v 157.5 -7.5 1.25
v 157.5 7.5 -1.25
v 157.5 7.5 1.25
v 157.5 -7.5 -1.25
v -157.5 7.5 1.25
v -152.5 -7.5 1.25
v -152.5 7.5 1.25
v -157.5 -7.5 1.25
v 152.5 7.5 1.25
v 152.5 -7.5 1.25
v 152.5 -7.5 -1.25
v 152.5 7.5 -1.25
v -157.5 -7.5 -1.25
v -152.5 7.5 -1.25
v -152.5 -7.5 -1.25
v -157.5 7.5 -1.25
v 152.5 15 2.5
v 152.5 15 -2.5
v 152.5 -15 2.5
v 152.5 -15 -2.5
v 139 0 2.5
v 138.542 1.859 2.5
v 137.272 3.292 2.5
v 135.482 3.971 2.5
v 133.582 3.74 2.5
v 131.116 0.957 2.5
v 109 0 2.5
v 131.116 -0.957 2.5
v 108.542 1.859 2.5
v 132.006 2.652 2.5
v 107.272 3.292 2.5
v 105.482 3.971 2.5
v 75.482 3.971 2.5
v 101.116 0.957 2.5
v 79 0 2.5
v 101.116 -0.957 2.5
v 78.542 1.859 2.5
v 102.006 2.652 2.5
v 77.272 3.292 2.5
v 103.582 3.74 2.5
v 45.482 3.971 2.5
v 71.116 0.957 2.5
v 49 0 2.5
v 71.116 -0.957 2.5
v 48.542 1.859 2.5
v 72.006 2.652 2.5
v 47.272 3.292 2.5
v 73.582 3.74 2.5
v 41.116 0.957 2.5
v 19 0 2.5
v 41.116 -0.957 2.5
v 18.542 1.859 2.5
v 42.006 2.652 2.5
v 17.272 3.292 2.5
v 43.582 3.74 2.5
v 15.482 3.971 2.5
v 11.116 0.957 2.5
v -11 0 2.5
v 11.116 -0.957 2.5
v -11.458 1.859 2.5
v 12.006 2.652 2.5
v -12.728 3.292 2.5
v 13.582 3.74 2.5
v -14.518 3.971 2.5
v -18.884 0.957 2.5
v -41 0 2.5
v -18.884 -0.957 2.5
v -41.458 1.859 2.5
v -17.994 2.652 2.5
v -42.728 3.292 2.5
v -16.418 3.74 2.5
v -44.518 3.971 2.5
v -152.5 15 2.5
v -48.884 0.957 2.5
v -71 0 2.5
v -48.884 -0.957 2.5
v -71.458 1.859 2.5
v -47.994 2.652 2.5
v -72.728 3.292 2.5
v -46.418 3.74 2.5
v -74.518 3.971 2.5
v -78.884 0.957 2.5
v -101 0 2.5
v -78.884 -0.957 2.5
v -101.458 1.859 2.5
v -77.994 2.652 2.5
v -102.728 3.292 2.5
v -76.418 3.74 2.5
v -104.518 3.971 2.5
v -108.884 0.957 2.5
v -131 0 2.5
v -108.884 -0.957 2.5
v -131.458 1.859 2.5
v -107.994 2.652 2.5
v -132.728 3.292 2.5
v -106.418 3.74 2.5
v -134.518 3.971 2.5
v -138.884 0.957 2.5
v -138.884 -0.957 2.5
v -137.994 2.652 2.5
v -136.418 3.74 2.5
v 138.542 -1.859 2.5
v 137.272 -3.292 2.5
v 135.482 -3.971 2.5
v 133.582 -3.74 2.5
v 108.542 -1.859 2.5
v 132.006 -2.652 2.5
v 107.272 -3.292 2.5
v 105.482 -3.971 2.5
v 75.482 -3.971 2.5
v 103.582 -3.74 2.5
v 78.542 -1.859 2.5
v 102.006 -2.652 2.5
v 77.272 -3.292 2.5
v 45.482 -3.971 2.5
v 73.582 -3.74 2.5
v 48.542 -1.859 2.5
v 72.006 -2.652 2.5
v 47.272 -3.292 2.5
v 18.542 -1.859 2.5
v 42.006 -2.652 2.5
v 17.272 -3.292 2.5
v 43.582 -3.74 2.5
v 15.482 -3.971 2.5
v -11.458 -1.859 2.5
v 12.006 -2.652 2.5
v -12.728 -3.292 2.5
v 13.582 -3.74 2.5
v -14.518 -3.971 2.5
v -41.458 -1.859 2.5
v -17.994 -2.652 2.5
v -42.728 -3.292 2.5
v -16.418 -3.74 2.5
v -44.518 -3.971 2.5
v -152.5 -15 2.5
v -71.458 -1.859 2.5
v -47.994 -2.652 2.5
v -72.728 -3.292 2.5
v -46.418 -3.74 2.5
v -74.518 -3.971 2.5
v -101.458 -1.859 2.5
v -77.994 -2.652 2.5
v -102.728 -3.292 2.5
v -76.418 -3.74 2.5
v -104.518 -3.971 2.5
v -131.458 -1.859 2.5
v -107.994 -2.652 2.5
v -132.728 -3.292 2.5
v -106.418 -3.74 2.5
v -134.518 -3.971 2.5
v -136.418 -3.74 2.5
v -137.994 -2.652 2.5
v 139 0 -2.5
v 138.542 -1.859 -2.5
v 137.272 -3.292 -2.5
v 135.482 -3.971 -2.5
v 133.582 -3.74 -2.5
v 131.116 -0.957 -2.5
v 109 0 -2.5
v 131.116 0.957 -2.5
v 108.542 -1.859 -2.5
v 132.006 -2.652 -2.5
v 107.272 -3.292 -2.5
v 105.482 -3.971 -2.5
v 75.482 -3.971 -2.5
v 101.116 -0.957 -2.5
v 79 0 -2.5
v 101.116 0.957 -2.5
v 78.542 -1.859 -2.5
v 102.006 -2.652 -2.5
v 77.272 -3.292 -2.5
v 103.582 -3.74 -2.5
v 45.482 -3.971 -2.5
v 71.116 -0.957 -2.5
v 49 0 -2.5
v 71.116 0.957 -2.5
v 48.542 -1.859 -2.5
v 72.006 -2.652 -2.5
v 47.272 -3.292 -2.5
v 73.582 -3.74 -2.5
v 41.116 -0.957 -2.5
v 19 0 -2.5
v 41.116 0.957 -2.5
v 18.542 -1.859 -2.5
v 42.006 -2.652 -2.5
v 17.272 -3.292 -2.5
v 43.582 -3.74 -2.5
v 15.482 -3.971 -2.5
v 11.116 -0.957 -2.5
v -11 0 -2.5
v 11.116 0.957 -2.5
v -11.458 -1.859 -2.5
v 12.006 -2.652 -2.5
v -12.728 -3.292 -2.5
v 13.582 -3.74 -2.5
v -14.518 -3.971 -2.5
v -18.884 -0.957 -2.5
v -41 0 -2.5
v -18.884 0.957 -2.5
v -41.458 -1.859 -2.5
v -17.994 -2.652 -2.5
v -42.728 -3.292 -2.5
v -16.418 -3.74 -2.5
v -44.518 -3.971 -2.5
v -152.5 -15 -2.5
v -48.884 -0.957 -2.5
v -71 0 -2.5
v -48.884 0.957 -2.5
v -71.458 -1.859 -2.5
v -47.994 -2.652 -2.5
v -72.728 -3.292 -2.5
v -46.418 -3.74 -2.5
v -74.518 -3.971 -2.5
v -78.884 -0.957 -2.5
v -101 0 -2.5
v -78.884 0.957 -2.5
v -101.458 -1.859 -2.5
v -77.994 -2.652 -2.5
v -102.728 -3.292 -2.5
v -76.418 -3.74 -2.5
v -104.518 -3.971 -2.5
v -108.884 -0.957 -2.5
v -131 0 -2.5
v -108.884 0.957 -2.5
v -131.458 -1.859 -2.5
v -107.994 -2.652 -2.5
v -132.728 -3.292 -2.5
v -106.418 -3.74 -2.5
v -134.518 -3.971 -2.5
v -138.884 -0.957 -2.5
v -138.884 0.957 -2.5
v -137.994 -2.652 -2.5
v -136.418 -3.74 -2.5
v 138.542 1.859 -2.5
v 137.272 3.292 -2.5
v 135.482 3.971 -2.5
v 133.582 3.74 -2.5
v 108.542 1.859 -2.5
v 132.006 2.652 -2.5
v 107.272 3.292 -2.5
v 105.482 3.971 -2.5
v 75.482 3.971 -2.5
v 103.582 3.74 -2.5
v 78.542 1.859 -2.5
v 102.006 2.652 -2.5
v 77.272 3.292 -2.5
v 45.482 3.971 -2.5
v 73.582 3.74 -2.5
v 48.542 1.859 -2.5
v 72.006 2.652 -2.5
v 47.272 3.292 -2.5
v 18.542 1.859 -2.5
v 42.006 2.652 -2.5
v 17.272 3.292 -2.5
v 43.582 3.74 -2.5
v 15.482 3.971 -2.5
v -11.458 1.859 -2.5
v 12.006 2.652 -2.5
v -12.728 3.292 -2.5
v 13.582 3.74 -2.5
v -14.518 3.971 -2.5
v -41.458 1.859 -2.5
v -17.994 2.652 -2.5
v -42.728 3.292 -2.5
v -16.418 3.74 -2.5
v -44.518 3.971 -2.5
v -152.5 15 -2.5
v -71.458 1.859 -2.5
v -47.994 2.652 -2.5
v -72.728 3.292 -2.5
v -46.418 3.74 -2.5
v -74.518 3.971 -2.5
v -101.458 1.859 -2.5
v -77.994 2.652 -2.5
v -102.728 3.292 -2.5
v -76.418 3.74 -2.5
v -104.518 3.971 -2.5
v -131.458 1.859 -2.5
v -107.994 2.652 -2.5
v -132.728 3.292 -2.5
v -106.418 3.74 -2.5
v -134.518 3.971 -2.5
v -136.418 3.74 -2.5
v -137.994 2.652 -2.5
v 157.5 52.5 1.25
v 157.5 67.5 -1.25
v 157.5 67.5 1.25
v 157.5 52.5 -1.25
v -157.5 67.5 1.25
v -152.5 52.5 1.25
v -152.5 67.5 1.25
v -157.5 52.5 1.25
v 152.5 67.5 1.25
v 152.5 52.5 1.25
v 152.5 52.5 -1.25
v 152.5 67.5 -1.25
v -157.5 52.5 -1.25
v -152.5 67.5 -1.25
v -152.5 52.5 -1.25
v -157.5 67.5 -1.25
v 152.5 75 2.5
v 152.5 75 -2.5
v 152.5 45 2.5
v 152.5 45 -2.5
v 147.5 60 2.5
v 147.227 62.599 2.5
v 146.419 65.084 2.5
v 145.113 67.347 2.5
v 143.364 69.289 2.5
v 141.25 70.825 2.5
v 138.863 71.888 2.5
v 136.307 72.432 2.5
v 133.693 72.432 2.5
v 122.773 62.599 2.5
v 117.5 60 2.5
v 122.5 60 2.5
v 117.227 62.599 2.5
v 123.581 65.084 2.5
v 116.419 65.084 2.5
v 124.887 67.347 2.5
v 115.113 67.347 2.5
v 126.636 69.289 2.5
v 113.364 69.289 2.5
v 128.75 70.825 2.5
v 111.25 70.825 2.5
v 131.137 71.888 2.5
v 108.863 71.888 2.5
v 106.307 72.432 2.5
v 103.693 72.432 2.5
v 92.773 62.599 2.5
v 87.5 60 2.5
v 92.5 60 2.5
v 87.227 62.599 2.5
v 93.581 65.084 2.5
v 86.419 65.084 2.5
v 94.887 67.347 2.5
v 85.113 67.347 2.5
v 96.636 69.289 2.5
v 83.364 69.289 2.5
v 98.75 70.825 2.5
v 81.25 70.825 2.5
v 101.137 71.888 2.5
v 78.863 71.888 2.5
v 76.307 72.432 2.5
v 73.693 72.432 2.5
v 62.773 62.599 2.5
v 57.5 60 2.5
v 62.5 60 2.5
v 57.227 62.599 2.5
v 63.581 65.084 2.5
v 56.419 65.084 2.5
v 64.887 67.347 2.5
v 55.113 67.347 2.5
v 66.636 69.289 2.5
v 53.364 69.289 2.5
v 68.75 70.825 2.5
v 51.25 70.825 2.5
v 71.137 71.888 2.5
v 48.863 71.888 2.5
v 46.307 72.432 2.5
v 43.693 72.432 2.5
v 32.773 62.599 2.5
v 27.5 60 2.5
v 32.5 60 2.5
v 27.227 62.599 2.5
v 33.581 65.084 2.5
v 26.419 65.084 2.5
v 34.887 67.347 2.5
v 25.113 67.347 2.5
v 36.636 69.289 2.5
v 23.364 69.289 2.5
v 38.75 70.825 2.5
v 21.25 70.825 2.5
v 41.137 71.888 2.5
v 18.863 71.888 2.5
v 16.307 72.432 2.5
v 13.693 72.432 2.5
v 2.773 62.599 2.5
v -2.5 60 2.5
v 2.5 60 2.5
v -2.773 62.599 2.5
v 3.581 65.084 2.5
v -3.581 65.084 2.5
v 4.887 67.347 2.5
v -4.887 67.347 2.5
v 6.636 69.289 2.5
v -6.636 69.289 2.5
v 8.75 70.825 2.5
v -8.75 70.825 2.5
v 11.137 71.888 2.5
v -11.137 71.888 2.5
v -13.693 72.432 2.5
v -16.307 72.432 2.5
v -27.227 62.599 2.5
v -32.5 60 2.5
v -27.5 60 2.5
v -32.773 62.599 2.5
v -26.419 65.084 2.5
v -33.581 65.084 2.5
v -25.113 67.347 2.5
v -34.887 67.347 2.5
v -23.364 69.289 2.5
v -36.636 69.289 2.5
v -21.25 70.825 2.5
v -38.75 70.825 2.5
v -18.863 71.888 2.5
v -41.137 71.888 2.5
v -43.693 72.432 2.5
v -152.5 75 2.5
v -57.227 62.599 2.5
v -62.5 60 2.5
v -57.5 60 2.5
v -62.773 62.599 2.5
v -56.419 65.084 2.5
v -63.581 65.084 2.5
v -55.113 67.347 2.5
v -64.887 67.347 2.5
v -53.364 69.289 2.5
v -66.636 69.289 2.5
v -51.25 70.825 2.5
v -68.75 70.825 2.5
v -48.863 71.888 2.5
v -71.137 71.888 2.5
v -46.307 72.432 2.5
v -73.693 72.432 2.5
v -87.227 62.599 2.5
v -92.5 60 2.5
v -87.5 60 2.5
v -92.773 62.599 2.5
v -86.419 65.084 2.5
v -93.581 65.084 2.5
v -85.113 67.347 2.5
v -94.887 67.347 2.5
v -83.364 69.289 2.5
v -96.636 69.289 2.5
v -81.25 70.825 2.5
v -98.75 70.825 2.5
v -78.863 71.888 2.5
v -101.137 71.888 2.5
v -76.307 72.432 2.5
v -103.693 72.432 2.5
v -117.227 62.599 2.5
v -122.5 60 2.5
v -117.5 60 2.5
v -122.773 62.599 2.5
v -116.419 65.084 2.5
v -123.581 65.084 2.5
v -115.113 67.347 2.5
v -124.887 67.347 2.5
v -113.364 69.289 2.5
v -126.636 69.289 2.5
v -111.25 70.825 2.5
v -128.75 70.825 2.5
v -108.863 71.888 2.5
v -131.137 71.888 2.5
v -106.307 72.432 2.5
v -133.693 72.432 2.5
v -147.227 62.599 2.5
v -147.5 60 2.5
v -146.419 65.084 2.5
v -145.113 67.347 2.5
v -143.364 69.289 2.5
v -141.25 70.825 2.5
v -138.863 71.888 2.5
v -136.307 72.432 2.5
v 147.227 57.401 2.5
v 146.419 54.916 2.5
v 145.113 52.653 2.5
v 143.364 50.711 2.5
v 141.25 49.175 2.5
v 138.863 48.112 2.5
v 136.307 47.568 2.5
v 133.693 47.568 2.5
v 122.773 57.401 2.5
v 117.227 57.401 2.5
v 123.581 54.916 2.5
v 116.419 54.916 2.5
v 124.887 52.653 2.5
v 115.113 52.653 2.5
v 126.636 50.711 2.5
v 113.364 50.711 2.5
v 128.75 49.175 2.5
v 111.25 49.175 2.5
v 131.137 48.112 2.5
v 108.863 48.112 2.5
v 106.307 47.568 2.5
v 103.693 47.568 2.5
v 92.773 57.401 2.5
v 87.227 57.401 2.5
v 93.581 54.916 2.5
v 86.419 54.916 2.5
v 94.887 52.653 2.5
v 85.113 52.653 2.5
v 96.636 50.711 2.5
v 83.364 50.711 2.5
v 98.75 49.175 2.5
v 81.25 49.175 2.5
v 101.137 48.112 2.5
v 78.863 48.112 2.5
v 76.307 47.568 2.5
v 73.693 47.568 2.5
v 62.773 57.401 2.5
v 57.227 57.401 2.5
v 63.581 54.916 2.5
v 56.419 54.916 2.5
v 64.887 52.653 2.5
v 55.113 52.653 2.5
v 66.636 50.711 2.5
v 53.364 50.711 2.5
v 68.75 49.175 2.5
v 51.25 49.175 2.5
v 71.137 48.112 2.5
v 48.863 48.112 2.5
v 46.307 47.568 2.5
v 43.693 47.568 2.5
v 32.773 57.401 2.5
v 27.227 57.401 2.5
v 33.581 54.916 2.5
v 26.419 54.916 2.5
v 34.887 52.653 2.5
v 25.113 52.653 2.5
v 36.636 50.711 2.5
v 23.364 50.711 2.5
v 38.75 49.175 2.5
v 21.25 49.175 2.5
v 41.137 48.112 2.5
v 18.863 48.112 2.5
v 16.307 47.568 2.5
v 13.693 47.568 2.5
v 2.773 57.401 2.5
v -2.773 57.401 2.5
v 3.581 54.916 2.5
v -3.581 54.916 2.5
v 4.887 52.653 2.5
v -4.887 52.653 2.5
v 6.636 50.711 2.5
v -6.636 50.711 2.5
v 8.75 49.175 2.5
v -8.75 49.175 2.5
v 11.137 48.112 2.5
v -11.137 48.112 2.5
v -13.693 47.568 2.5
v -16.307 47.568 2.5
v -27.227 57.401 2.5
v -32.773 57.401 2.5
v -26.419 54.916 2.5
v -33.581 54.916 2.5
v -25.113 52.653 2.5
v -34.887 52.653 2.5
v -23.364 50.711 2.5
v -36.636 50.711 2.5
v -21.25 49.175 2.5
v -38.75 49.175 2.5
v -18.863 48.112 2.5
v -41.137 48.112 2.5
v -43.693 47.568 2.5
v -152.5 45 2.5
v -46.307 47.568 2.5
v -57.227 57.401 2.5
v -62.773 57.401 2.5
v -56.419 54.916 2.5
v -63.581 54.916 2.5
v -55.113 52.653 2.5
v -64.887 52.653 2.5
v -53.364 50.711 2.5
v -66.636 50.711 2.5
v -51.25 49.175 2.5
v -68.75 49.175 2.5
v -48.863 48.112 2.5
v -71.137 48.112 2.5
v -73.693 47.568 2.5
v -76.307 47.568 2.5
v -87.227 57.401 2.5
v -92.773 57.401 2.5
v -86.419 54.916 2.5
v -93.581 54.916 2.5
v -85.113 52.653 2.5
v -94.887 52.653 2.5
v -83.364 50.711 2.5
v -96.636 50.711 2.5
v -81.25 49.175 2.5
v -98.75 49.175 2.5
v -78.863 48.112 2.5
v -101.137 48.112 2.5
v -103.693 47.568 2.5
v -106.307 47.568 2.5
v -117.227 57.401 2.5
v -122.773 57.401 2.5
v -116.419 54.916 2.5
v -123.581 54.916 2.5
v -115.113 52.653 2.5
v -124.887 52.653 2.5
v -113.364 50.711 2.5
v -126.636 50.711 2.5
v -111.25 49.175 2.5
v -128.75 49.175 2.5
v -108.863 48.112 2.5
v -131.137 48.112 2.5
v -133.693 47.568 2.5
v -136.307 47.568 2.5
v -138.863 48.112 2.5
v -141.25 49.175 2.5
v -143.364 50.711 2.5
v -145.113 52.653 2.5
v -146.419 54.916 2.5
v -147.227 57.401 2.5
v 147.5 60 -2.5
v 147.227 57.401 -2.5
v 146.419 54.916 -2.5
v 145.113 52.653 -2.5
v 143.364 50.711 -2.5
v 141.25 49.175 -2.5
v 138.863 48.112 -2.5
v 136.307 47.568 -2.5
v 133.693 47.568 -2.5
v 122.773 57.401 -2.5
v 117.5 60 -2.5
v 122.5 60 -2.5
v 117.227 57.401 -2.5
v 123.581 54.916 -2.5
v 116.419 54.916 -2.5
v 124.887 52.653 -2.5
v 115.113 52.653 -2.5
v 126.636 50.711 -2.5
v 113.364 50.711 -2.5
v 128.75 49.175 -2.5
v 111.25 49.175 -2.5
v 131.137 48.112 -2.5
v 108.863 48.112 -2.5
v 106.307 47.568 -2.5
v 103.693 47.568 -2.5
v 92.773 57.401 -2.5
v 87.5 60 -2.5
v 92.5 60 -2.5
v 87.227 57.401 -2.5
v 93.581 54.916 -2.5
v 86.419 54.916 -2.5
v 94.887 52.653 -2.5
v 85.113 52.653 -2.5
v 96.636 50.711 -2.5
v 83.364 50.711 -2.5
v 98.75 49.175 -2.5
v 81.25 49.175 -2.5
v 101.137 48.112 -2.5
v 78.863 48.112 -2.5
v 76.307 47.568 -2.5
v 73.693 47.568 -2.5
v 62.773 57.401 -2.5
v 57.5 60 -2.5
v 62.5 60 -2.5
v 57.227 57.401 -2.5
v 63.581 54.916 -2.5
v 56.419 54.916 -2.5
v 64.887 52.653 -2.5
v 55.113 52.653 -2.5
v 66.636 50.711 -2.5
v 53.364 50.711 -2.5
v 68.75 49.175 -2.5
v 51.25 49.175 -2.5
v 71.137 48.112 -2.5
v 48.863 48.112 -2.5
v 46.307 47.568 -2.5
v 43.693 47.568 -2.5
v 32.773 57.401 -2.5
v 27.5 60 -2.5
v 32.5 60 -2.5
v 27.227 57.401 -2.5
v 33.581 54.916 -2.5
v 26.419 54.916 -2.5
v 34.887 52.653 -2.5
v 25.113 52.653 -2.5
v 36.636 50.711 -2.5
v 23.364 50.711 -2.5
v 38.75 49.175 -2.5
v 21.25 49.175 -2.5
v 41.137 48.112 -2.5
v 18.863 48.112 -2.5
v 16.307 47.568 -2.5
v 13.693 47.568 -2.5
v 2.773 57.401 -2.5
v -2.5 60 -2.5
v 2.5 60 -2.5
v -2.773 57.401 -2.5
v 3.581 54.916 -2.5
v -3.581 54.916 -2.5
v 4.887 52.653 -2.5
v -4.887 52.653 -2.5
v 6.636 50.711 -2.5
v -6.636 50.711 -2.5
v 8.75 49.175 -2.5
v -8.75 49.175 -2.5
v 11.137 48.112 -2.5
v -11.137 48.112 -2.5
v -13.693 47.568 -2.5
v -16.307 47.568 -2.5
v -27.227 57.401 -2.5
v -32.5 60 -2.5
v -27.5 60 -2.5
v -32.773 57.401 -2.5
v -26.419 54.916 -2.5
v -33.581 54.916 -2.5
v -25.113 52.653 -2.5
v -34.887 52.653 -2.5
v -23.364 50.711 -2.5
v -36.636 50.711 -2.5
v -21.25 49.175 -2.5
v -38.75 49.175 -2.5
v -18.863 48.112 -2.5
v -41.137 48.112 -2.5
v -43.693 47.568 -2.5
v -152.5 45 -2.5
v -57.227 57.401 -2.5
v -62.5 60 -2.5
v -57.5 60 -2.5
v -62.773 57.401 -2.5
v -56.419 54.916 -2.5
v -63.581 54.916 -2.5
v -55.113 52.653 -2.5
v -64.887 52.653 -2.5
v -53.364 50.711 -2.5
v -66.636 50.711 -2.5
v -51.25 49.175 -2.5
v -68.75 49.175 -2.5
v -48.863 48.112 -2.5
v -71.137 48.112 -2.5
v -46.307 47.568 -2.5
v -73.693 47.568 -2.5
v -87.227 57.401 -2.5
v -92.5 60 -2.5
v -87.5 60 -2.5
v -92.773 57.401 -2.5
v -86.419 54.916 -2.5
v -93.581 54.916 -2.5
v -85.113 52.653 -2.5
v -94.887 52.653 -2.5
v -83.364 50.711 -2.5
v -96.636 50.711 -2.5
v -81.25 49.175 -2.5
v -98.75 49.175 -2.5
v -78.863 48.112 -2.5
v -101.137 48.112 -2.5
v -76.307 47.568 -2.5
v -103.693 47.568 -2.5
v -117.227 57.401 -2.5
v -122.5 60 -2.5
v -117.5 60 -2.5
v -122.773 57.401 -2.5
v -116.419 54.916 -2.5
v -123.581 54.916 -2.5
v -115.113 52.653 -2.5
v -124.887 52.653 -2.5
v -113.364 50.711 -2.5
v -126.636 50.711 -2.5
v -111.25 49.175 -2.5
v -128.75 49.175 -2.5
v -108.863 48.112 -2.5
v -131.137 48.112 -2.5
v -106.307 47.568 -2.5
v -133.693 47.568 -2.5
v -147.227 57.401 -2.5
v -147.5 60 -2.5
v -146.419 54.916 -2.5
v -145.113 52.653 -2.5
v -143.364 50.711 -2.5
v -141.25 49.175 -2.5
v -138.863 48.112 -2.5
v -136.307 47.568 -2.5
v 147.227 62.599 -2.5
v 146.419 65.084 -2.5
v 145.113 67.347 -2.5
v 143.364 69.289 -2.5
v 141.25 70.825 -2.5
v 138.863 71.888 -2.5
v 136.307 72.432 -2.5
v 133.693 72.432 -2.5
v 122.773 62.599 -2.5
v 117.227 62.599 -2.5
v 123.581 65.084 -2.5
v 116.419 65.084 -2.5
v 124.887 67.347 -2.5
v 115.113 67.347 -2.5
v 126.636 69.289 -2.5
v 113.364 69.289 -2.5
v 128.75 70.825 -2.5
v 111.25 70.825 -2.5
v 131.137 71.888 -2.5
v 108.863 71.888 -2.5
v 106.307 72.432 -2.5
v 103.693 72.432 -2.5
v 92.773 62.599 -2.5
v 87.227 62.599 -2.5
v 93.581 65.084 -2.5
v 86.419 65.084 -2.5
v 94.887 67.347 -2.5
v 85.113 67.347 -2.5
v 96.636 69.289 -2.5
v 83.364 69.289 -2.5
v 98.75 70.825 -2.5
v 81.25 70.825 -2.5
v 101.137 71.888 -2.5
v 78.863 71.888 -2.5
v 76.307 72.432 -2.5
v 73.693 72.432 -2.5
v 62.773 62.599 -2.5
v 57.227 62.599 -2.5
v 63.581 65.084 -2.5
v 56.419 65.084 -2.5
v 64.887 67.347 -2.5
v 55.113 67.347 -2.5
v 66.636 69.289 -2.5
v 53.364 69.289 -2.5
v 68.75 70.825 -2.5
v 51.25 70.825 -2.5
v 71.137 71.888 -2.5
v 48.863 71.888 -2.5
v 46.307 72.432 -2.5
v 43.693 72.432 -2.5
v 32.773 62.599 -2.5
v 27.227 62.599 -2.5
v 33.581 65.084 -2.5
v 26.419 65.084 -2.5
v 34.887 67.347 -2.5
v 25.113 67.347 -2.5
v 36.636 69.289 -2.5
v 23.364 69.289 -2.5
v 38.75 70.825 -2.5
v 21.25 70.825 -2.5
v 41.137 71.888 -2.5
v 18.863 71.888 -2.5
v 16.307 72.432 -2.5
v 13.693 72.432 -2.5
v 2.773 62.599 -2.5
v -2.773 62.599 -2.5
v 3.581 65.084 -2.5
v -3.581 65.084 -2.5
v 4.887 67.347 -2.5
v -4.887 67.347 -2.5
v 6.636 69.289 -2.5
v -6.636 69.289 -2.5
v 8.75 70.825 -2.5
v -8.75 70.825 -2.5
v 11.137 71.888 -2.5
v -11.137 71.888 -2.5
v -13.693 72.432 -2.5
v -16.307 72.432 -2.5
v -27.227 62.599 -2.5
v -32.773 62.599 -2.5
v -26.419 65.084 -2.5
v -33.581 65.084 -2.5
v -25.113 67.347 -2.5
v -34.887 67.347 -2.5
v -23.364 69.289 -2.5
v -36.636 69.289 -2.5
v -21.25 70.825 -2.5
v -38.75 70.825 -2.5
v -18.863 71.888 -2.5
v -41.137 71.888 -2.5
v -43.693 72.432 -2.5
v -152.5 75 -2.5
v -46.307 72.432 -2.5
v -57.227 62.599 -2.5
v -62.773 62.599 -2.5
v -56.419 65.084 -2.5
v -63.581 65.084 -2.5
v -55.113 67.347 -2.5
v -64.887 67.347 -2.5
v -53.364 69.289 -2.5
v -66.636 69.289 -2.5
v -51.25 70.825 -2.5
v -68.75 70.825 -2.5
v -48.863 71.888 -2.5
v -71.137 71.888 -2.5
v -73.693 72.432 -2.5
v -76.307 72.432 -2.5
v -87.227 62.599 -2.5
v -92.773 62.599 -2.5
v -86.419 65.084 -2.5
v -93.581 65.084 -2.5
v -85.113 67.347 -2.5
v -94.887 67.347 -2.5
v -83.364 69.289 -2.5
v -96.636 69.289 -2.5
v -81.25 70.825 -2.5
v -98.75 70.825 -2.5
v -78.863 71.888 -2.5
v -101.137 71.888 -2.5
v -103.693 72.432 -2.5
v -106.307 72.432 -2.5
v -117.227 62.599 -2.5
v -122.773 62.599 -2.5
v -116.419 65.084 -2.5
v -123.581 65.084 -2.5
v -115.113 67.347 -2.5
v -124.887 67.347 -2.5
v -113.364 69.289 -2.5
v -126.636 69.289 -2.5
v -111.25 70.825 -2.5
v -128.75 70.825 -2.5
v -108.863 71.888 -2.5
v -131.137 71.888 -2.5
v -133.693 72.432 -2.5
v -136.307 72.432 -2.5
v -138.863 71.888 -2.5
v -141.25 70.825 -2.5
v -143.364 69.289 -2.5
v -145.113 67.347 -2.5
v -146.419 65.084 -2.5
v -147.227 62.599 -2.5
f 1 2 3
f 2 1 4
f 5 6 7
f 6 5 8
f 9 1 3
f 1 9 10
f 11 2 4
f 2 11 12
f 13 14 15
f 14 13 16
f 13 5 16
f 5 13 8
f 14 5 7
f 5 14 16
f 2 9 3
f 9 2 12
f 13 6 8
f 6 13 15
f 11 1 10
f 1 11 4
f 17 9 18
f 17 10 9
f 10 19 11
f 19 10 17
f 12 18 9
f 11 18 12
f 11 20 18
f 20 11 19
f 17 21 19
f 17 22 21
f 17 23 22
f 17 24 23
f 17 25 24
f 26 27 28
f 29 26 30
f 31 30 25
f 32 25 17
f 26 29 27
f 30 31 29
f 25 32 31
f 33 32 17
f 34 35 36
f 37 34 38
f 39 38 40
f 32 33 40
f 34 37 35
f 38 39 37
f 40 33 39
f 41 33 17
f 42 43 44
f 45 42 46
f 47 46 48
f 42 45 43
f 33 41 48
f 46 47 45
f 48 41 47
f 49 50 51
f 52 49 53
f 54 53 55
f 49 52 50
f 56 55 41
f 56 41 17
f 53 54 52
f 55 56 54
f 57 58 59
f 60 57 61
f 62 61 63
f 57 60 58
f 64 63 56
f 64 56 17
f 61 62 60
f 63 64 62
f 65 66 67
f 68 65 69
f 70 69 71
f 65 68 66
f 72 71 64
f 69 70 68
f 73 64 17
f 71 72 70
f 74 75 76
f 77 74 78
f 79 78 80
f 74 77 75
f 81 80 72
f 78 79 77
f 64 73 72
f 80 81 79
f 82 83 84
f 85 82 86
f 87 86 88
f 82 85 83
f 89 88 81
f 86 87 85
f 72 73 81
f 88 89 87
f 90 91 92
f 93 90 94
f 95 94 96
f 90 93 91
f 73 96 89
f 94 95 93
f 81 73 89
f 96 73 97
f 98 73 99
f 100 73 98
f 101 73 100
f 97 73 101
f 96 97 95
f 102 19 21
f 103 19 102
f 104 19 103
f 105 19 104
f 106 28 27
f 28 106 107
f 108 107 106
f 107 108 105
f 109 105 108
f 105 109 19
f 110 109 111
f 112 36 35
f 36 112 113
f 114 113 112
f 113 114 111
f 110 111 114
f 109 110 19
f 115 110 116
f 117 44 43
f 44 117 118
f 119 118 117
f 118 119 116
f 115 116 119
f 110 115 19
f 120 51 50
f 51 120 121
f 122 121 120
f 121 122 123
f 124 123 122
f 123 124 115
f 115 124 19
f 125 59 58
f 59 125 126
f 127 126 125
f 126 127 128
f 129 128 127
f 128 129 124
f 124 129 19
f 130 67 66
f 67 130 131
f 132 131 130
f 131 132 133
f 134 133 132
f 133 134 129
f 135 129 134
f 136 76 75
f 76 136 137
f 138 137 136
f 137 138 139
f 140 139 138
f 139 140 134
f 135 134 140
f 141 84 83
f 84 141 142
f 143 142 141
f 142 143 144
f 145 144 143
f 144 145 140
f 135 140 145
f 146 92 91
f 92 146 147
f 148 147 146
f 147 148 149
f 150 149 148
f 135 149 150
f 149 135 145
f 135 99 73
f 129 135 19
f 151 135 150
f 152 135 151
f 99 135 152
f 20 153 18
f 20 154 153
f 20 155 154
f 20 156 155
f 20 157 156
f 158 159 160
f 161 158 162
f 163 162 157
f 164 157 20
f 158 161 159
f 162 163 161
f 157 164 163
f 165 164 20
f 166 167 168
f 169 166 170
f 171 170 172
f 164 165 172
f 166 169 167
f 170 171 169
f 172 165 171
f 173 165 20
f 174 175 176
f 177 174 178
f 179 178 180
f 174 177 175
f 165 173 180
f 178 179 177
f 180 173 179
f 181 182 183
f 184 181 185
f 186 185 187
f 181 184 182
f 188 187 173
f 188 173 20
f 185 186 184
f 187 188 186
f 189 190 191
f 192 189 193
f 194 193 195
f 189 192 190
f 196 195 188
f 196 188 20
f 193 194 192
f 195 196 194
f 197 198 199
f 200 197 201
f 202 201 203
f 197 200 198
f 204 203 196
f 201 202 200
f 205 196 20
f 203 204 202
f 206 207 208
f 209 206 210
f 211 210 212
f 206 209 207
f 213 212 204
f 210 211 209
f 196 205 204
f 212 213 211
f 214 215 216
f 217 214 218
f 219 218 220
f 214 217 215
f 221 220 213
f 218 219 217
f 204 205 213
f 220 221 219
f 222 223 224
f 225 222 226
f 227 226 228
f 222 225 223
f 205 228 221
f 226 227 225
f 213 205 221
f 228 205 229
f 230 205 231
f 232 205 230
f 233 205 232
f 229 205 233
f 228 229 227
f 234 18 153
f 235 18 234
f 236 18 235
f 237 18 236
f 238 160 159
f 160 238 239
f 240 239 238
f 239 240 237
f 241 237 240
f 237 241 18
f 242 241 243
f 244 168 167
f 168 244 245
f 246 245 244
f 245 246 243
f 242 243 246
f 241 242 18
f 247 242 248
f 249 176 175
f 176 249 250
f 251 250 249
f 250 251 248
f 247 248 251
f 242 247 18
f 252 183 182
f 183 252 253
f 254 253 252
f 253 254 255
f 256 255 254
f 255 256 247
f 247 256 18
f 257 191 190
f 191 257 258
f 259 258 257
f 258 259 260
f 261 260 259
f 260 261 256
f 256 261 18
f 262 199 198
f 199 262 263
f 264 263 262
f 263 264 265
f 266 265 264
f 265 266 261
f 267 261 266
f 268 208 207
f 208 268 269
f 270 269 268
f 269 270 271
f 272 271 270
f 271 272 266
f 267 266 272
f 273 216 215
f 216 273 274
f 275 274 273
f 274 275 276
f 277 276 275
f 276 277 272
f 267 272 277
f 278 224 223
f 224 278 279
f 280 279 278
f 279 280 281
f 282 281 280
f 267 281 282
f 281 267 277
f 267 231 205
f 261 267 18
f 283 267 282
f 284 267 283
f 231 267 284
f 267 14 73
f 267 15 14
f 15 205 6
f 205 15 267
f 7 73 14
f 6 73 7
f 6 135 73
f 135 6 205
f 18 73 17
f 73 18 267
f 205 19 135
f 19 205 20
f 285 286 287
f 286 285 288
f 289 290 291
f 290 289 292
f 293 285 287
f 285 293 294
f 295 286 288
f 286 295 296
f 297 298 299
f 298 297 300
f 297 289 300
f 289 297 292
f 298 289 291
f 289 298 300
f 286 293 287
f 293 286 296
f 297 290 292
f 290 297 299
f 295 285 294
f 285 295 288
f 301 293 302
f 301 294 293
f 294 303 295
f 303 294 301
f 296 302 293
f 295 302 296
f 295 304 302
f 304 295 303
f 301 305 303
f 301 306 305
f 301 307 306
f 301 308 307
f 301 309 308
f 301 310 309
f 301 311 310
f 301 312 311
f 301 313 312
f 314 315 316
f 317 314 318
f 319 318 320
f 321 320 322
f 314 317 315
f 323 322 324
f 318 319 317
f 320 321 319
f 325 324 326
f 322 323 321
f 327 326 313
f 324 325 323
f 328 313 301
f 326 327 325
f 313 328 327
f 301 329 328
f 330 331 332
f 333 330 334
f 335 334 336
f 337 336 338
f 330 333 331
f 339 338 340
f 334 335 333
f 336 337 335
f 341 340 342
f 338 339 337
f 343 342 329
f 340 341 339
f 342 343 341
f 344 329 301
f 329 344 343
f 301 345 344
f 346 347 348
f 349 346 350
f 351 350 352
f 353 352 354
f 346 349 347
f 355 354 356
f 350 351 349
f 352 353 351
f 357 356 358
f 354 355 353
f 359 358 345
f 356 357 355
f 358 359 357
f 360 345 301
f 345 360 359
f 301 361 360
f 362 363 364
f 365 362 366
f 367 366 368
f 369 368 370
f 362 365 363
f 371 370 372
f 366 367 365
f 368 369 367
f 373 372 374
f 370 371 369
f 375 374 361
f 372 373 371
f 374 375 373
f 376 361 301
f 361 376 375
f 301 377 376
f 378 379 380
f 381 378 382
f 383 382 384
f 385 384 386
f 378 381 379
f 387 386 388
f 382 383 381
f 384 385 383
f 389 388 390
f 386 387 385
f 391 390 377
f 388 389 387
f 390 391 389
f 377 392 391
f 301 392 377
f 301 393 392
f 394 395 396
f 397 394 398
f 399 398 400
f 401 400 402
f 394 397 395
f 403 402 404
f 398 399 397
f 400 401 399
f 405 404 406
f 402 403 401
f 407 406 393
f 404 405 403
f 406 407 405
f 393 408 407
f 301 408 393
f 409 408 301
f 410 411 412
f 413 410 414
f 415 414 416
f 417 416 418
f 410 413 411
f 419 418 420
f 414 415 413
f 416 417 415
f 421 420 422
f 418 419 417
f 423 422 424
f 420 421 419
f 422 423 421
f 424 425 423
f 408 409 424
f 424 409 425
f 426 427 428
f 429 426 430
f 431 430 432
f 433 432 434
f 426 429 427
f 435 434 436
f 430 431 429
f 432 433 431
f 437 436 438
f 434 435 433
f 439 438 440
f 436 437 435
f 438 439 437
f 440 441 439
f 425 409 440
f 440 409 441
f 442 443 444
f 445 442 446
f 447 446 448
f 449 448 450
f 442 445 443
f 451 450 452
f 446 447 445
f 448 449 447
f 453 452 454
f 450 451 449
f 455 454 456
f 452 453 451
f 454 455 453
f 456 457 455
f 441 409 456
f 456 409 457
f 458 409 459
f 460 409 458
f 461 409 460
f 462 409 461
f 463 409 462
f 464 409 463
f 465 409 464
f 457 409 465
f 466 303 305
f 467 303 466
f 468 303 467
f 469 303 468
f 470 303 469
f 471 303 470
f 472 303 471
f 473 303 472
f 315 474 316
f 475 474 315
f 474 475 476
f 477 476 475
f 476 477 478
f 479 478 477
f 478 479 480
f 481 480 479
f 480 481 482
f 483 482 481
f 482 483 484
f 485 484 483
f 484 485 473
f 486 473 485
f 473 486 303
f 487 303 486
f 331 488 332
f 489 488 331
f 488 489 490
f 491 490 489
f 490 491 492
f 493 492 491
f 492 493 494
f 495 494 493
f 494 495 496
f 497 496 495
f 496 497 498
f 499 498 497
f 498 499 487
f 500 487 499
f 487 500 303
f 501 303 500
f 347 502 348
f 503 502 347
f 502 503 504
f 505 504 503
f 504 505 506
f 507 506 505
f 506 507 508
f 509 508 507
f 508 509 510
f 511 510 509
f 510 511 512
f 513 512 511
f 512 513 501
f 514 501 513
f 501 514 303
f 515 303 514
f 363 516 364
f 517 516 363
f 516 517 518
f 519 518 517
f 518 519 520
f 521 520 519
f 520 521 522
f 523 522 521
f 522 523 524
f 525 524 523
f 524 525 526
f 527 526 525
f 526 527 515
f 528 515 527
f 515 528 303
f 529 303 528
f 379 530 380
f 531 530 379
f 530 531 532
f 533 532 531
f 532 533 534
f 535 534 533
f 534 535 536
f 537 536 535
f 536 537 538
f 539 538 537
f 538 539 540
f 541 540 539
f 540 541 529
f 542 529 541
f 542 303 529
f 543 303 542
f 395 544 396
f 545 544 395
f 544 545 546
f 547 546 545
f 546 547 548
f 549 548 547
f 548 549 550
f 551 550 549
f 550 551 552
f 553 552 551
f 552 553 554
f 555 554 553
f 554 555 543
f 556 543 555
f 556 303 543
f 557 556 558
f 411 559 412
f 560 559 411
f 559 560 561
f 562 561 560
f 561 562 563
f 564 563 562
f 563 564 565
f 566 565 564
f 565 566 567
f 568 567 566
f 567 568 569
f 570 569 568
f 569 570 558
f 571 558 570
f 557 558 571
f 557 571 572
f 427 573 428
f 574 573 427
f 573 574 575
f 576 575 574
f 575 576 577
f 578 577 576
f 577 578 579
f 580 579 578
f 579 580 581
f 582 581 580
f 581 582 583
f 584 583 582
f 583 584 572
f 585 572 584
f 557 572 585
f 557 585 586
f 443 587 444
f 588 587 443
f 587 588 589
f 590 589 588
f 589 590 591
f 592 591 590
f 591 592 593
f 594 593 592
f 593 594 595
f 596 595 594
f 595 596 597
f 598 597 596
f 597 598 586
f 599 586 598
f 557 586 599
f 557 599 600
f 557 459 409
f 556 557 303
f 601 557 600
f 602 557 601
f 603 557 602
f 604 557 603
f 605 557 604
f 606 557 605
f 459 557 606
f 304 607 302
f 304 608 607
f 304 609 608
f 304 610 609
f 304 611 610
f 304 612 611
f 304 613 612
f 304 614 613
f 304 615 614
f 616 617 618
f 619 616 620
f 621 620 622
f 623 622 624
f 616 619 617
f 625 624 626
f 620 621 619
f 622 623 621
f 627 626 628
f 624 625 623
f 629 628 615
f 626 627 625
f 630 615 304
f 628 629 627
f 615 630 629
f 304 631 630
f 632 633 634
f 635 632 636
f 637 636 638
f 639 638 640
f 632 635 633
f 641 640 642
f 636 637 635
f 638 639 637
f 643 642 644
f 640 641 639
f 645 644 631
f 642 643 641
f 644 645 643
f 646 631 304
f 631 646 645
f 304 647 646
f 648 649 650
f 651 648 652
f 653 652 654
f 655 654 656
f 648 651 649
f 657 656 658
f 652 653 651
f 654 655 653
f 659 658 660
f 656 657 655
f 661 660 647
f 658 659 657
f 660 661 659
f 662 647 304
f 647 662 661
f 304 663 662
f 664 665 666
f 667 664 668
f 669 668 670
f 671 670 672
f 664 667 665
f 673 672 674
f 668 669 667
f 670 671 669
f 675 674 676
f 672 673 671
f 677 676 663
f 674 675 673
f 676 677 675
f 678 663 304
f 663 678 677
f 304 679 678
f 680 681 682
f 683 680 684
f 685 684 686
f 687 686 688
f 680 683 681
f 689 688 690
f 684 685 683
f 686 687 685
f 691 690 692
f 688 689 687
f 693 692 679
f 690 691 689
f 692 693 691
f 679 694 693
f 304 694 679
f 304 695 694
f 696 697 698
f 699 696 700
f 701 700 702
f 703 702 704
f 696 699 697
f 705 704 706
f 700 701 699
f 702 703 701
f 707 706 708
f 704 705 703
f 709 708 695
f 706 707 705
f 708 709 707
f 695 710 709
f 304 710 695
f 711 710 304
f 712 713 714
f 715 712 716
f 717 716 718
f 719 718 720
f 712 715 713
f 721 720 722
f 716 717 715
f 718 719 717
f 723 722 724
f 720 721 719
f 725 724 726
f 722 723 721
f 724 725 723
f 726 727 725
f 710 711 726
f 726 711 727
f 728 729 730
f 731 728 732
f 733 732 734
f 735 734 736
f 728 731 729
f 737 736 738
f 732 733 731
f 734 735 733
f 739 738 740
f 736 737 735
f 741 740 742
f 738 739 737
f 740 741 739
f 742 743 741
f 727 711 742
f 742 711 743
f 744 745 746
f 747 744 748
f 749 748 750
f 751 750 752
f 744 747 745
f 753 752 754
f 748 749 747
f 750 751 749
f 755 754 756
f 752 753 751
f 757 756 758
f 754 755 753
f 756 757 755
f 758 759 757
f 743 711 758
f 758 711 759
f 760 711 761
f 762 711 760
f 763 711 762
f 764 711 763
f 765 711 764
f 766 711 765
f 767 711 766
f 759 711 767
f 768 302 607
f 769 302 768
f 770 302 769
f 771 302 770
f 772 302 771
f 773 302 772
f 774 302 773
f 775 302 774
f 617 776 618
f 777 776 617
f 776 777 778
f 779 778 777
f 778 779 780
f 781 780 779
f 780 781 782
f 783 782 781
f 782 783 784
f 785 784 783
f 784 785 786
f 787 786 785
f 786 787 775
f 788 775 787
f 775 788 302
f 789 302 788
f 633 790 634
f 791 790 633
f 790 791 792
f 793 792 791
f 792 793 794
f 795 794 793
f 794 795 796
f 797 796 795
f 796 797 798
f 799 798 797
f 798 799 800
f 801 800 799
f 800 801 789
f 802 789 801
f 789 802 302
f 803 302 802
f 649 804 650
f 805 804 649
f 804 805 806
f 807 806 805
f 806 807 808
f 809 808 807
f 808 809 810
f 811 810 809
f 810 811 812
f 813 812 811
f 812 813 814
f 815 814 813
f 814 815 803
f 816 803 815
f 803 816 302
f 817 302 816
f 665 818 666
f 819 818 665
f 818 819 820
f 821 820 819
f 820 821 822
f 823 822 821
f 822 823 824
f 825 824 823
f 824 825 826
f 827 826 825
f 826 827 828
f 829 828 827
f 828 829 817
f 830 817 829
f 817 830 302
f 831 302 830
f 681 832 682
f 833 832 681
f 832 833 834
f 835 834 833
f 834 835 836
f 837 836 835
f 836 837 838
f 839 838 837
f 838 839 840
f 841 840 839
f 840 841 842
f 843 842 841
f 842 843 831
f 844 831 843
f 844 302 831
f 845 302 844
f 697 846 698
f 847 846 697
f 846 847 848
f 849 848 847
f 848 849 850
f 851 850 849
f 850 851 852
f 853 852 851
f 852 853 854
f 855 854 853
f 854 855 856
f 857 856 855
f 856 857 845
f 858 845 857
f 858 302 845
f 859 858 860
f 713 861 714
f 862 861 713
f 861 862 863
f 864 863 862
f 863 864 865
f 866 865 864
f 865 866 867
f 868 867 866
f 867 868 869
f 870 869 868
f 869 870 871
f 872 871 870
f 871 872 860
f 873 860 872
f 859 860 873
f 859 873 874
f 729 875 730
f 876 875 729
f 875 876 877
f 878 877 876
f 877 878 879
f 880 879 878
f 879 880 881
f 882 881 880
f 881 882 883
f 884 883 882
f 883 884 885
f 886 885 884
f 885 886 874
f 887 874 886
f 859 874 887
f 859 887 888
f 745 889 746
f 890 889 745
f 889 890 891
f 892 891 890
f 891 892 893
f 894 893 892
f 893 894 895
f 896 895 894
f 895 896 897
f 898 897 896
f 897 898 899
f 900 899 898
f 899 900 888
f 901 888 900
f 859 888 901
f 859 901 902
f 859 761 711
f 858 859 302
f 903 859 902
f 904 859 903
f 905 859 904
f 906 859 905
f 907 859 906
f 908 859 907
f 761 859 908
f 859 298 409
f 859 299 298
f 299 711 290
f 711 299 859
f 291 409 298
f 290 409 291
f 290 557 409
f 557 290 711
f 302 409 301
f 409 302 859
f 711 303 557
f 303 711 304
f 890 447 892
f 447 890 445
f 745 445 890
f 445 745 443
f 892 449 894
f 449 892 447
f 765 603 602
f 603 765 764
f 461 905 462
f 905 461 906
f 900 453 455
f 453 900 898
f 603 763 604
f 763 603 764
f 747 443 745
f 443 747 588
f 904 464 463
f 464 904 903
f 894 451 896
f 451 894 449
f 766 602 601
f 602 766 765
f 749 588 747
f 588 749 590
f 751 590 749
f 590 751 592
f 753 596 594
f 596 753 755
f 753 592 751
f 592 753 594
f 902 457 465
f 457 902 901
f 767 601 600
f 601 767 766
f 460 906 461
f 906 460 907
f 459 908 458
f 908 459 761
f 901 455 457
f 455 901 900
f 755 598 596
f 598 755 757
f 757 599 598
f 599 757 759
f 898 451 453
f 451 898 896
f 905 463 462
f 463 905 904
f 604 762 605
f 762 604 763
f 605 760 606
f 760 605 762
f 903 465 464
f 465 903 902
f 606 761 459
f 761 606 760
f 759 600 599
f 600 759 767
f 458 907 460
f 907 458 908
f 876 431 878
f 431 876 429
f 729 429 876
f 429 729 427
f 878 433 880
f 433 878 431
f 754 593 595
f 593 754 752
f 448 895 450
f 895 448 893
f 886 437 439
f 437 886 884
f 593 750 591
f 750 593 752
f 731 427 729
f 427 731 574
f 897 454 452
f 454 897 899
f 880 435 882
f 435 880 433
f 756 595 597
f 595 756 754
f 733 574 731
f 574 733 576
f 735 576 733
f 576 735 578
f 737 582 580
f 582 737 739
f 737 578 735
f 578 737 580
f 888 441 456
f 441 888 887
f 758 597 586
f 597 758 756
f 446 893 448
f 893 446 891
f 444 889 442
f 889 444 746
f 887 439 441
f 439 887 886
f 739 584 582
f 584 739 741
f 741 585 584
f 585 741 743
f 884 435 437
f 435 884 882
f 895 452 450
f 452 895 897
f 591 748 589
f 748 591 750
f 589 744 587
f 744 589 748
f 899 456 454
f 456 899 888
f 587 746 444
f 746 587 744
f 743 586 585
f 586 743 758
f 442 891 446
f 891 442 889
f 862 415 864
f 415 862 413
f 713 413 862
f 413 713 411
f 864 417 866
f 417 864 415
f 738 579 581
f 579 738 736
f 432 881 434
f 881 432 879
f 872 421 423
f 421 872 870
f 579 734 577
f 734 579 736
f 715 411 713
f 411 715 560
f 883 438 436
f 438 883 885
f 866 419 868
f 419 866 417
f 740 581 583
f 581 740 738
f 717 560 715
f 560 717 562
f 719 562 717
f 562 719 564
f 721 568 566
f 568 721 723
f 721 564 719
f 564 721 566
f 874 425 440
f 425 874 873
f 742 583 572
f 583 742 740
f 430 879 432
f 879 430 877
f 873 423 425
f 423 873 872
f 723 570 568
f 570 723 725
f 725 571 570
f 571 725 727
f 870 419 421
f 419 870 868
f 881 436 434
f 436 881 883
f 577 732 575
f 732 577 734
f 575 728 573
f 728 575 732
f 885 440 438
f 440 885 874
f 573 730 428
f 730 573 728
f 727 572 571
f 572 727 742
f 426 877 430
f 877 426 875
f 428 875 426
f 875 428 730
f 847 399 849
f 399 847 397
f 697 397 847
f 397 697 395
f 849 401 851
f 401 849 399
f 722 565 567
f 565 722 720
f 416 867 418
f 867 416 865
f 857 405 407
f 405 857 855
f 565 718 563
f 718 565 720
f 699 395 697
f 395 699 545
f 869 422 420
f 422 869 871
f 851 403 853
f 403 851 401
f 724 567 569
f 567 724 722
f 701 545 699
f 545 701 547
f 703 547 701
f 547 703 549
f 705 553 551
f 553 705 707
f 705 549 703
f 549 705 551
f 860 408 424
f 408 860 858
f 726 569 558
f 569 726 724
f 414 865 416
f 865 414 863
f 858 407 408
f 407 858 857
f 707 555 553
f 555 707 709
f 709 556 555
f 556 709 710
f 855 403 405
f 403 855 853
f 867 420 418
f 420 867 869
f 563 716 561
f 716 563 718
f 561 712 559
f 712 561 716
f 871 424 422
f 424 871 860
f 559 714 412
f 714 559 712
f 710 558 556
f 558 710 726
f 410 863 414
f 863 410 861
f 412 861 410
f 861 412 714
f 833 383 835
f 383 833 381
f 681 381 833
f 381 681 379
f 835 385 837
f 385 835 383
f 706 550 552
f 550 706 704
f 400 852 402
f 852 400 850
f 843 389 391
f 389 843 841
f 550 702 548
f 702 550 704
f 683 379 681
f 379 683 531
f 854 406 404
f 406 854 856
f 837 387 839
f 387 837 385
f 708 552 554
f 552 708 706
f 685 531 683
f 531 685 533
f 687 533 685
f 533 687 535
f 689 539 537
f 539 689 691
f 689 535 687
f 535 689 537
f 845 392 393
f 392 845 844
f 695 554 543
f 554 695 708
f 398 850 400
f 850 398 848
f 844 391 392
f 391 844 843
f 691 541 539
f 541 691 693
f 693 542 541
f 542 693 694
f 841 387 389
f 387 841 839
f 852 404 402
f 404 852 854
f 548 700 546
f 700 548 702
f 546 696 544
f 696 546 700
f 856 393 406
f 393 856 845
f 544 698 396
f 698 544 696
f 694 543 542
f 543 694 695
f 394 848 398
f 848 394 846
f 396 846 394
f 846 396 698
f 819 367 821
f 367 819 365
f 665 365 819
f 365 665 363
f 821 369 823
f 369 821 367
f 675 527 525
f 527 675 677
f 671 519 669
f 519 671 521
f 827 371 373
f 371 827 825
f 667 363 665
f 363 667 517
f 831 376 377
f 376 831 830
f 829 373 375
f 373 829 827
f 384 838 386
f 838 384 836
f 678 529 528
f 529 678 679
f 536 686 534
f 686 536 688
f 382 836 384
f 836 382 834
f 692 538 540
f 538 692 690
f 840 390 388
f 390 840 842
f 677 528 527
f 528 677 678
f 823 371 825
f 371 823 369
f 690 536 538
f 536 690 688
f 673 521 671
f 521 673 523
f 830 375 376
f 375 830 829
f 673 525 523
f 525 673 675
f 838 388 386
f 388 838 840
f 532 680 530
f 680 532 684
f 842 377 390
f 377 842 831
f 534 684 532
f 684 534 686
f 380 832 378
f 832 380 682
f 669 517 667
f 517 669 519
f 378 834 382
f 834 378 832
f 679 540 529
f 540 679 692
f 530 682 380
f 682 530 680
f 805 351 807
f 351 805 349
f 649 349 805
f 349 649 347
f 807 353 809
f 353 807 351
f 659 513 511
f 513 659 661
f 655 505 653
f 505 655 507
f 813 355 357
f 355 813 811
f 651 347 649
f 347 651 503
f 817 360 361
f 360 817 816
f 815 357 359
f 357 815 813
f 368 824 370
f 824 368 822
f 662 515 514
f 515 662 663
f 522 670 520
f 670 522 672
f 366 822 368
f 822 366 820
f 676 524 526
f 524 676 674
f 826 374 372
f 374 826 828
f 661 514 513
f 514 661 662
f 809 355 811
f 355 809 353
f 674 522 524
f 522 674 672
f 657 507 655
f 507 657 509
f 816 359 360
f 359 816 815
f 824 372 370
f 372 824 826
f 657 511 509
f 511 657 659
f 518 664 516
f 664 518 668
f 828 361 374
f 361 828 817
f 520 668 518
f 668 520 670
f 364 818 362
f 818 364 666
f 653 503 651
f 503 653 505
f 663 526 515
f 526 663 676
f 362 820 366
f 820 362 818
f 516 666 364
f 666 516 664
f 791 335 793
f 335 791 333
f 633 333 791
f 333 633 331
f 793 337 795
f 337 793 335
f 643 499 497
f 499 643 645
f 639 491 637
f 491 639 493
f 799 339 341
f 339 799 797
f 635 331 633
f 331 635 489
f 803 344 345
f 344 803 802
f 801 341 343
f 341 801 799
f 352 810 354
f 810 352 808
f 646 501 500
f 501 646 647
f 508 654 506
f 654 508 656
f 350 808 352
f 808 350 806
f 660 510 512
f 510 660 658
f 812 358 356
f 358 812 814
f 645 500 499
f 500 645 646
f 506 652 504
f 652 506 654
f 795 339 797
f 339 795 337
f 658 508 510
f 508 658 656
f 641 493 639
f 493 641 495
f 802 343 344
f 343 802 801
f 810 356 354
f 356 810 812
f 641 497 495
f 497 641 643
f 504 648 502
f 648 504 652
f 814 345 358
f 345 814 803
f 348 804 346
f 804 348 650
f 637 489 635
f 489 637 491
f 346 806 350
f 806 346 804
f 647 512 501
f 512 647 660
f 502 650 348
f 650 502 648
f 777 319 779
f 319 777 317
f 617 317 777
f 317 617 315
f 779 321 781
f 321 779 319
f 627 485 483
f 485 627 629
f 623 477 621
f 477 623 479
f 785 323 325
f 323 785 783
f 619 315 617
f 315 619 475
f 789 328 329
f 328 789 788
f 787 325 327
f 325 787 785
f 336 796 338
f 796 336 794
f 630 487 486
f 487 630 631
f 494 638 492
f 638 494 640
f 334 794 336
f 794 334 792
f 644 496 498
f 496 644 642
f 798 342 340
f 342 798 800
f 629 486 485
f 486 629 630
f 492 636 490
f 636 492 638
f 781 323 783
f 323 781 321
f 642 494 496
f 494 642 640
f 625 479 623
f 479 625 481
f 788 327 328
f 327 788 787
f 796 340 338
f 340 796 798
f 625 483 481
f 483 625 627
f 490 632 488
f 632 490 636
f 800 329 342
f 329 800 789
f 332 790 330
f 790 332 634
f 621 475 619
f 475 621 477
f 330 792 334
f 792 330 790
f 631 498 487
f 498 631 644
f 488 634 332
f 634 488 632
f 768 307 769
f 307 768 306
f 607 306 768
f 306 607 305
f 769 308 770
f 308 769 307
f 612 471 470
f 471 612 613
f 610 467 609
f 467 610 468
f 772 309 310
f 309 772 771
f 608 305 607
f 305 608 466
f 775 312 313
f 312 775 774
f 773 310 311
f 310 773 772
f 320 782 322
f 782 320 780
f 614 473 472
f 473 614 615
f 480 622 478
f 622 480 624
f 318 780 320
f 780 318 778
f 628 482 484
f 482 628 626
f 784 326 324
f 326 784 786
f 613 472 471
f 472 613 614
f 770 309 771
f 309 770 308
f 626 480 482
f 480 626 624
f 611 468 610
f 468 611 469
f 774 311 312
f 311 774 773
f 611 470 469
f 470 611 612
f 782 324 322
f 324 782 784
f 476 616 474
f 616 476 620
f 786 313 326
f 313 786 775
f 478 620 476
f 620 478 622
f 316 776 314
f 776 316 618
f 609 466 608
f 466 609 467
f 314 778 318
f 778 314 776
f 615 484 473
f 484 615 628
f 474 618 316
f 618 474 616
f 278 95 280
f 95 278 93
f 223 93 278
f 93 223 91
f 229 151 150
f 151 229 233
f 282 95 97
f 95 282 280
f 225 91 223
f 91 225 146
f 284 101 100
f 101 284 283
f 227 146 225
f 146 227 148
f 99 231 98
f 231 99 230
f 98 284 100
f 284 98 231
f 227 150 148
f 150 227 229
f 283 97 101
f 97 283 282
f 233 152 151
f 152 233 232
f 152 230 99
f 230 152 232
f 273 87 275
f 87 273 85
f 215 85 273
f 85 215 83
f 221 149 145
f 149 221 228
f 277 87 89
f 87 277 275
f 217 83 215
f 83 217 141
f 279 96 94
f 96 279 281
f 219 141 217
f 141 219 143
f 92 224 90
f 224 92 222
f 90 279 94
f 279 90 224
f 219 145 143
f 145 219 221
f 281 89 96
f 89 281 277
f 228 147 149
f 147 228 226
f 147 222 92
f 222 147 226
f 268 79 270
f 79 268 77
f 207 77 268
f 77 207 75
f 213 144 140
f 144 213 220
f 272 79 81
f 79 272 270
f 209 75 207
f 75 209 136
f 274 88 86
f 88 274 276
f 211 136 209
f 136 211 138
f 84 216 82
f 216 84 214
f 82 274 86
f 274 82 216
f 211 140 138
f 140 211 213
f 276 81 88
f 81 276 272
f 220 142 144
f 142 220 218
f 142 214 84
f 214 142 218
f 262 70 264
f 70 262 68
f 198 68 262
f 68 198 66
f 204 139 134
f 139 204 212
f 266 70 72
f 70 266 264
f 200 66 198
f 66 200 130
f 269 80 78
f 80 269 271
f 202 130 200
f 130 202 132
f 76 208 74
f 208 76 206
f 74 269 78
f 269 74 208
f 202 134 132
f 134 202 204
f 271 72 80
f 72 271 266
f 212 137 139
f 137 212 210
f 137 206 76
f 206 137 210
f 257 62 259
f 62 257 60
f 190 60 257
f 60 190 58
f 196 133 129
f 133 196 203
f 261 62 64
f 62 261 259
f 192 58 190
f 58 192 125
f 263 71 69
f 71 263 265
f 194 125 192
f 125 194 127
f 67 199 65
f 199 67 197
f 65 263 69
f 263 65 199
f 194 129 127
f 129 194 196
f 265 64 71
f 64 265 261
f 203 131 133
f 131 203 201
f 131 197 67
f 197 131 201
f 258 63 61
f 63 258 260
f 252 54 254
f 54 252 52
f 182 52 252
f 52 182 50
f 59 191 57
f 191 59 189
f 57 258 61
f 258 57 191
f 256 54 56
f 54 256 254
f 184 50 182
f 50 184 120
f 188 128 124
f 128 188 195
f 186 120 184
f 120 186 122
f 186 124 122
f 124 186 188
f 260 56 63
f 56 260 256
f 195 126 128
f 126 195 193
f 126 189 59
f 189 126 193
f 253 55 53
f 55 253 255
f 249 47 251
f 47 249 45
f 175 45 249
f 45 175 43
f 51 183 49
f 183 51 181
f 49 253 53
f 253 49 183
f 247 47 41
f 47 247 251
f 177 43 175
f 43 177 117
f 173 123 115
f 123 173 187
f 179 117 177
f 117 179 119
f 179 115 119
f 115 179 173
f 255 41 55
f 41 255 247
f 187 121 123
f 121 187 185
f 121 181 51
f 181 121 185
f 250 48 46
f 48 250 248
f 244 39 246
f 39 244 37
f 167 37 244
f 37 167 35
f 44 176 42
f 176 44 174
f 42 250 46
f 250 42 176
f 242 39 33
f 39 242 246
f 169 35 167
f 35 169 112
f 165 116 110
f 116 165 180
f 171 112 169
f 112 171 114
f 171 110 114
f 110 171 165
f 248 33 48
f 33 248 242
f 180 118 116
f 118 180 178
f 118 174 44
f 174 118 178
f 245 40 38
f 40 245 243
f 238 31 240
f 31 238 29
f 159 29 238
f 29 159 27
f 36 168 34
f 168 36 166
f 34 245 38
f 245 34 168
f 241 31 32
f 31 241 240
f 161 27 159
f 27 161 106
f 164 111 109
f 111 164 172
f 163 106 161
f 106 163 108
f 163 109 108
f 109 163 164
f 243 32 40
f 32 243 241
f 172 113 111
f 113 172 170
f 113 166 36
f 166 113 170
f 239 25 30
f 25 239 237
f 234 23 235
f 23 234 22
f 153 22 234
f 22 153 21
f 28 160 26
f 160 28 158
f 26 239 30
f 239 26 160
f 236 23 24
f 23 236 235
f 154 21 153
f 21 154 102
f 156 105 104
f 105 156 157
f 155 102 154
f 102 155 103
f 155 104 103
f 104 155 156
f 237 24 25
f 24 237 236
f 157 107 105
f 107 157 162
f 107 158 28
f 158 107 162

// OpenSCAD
// Number of holes in the rail
hole_num = 10;

/*
    Variables that effect the top rail
*/
// Hole the paint bottle slips into in mm
body_hole_diameter = 25;
// The space between each hole in mm
body_hole_gap = 5;

/*
     Variables that effect the bottom rail
*/
nozzle_hole_diameter = 8;
nozzle_hole_gap = (body_hole_diameter / 2) + body_hole_gap;

/* 
Variables that effect the rail dimensions
*/
// Depth of the rail in mm
rail_depth = body_hole_diameter + 5;
// Length of the rail in mm; Space consumed by the holes + The space between the holes + beginning and end gap
rail_width = (hole_num * body_hole_diameter) + ((hole_num - 1) * body_hole_gap) + (2 * body_hole_gap);
// The thickness of the rail in mm
rail_height = 5;
// The width of the locking tabs
tab_width = 5;
// the height of the tab; default is 1/2 of the rail height
tab_height = rail_height / 2;


module rail() {
    union () {
        // add the locking tabs
        cube([rail_width + (tab_width * 2), rail_depth / 2, rail_height / 2], center=true);
        // add the rail
        cube([rail_width, rail_depth, rail_height], center=true);
    }
}


module top_rail() {

    difference () {
        rail();
        // Punch out the holes
        for( x=[((rail_width / 2) * -1) + body_hole_gap + (body_hole_diameter / 2) : (body_hole_gap + body_hole_diameter) : (rail_width / 2) - body_hole_gap - (body_hole_diameter / 2)] ) {
            translate([x, 0, 0])
                cylinder(r=(body_hole_diameter / 2), h=rail_height + 1, center=true);
        }
    }
}

module bottom_rail() {
    difference () {
        rail();
        // punch out the holes
        for( x=[((rail_width / 2) * -1) + body_hole_gap + (body_hole_diameter / 2) : (body_hole_gap + body_hole_diameter) : (rail_width / 2) - body_hole_gap - (body_hole_diameter / 2)] ) {
            translate([x, 0, 0])
                cylinder(r=(nozzle_hole_diameter / 2), h=rail_height + 1, center=true);
        }
    }

}

translate([0, 60, 0]) top_rail();
bottom_rail();
